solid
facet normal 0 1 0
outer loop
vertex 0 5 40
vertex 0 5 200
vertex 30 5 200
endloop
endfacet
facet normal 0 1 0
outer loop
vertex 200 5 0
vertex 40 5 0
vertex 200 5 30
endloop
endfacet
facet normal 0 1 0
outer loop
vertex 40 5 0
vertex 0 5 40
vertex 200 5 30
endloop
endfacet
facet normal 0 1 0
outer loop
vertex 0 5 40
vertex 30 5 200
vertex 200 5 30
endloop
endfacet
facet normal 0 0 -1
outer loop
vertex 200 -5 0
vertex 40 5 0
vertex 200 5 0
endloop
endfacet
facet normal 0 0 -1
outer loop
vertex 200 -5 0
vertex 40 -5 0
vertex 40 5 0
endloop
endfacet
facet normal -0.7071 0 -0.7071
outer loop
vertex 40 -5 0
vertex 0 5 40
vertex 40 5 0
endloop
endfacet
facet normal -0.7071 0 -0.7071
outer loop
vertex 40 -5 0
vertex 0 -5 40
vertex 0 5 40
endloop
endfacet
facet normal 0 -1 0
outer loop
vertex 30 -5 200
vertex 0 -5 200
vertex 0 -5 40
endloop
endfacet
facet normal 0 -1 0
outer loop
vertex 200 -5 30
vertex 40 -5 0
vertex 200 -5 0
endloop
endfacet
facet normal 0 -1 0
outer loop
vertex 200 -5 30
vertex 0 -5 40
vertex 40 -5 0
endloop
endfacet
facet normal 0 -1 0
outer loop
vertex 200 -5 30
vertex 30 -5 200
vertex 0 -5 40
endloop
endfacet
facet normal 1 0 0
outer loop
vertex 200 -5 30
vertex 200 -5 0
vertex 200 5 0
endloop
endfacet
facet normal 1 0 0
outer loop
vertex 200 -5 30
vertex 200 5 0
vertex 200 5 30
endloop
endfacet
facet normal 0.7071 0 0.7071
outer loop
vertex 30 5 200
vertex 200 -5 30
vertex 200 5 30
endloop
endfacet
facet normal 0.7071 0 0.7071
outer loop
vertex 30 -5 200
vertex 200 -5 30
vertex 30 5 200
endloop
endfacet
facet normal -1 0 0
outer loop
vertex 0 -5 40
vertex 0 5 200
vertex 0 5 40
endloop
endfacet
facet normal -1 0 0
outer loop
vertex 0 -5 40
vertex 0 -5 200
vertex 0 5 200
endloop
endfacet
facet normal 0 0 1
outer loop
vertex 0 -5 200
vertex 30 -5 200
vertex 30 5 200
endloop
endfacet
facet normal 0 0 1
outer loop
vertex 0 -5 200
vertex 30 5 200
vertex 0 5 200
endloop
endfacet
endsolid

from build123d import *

# Parameters (mm, degrees)
PAD_DEPTH = 5


with BuildPart() as part:
    # Sketch → Pad (new body, symmetric)
    with BuildSketch(Plane.XZ):
        Polygon((40, 0), (200, 0), (200, 30), (30, 200), (0, 200), (0, 40), align=None)
    extrude(amount=PAD_DEPTH, both=True)


solid = part.part
